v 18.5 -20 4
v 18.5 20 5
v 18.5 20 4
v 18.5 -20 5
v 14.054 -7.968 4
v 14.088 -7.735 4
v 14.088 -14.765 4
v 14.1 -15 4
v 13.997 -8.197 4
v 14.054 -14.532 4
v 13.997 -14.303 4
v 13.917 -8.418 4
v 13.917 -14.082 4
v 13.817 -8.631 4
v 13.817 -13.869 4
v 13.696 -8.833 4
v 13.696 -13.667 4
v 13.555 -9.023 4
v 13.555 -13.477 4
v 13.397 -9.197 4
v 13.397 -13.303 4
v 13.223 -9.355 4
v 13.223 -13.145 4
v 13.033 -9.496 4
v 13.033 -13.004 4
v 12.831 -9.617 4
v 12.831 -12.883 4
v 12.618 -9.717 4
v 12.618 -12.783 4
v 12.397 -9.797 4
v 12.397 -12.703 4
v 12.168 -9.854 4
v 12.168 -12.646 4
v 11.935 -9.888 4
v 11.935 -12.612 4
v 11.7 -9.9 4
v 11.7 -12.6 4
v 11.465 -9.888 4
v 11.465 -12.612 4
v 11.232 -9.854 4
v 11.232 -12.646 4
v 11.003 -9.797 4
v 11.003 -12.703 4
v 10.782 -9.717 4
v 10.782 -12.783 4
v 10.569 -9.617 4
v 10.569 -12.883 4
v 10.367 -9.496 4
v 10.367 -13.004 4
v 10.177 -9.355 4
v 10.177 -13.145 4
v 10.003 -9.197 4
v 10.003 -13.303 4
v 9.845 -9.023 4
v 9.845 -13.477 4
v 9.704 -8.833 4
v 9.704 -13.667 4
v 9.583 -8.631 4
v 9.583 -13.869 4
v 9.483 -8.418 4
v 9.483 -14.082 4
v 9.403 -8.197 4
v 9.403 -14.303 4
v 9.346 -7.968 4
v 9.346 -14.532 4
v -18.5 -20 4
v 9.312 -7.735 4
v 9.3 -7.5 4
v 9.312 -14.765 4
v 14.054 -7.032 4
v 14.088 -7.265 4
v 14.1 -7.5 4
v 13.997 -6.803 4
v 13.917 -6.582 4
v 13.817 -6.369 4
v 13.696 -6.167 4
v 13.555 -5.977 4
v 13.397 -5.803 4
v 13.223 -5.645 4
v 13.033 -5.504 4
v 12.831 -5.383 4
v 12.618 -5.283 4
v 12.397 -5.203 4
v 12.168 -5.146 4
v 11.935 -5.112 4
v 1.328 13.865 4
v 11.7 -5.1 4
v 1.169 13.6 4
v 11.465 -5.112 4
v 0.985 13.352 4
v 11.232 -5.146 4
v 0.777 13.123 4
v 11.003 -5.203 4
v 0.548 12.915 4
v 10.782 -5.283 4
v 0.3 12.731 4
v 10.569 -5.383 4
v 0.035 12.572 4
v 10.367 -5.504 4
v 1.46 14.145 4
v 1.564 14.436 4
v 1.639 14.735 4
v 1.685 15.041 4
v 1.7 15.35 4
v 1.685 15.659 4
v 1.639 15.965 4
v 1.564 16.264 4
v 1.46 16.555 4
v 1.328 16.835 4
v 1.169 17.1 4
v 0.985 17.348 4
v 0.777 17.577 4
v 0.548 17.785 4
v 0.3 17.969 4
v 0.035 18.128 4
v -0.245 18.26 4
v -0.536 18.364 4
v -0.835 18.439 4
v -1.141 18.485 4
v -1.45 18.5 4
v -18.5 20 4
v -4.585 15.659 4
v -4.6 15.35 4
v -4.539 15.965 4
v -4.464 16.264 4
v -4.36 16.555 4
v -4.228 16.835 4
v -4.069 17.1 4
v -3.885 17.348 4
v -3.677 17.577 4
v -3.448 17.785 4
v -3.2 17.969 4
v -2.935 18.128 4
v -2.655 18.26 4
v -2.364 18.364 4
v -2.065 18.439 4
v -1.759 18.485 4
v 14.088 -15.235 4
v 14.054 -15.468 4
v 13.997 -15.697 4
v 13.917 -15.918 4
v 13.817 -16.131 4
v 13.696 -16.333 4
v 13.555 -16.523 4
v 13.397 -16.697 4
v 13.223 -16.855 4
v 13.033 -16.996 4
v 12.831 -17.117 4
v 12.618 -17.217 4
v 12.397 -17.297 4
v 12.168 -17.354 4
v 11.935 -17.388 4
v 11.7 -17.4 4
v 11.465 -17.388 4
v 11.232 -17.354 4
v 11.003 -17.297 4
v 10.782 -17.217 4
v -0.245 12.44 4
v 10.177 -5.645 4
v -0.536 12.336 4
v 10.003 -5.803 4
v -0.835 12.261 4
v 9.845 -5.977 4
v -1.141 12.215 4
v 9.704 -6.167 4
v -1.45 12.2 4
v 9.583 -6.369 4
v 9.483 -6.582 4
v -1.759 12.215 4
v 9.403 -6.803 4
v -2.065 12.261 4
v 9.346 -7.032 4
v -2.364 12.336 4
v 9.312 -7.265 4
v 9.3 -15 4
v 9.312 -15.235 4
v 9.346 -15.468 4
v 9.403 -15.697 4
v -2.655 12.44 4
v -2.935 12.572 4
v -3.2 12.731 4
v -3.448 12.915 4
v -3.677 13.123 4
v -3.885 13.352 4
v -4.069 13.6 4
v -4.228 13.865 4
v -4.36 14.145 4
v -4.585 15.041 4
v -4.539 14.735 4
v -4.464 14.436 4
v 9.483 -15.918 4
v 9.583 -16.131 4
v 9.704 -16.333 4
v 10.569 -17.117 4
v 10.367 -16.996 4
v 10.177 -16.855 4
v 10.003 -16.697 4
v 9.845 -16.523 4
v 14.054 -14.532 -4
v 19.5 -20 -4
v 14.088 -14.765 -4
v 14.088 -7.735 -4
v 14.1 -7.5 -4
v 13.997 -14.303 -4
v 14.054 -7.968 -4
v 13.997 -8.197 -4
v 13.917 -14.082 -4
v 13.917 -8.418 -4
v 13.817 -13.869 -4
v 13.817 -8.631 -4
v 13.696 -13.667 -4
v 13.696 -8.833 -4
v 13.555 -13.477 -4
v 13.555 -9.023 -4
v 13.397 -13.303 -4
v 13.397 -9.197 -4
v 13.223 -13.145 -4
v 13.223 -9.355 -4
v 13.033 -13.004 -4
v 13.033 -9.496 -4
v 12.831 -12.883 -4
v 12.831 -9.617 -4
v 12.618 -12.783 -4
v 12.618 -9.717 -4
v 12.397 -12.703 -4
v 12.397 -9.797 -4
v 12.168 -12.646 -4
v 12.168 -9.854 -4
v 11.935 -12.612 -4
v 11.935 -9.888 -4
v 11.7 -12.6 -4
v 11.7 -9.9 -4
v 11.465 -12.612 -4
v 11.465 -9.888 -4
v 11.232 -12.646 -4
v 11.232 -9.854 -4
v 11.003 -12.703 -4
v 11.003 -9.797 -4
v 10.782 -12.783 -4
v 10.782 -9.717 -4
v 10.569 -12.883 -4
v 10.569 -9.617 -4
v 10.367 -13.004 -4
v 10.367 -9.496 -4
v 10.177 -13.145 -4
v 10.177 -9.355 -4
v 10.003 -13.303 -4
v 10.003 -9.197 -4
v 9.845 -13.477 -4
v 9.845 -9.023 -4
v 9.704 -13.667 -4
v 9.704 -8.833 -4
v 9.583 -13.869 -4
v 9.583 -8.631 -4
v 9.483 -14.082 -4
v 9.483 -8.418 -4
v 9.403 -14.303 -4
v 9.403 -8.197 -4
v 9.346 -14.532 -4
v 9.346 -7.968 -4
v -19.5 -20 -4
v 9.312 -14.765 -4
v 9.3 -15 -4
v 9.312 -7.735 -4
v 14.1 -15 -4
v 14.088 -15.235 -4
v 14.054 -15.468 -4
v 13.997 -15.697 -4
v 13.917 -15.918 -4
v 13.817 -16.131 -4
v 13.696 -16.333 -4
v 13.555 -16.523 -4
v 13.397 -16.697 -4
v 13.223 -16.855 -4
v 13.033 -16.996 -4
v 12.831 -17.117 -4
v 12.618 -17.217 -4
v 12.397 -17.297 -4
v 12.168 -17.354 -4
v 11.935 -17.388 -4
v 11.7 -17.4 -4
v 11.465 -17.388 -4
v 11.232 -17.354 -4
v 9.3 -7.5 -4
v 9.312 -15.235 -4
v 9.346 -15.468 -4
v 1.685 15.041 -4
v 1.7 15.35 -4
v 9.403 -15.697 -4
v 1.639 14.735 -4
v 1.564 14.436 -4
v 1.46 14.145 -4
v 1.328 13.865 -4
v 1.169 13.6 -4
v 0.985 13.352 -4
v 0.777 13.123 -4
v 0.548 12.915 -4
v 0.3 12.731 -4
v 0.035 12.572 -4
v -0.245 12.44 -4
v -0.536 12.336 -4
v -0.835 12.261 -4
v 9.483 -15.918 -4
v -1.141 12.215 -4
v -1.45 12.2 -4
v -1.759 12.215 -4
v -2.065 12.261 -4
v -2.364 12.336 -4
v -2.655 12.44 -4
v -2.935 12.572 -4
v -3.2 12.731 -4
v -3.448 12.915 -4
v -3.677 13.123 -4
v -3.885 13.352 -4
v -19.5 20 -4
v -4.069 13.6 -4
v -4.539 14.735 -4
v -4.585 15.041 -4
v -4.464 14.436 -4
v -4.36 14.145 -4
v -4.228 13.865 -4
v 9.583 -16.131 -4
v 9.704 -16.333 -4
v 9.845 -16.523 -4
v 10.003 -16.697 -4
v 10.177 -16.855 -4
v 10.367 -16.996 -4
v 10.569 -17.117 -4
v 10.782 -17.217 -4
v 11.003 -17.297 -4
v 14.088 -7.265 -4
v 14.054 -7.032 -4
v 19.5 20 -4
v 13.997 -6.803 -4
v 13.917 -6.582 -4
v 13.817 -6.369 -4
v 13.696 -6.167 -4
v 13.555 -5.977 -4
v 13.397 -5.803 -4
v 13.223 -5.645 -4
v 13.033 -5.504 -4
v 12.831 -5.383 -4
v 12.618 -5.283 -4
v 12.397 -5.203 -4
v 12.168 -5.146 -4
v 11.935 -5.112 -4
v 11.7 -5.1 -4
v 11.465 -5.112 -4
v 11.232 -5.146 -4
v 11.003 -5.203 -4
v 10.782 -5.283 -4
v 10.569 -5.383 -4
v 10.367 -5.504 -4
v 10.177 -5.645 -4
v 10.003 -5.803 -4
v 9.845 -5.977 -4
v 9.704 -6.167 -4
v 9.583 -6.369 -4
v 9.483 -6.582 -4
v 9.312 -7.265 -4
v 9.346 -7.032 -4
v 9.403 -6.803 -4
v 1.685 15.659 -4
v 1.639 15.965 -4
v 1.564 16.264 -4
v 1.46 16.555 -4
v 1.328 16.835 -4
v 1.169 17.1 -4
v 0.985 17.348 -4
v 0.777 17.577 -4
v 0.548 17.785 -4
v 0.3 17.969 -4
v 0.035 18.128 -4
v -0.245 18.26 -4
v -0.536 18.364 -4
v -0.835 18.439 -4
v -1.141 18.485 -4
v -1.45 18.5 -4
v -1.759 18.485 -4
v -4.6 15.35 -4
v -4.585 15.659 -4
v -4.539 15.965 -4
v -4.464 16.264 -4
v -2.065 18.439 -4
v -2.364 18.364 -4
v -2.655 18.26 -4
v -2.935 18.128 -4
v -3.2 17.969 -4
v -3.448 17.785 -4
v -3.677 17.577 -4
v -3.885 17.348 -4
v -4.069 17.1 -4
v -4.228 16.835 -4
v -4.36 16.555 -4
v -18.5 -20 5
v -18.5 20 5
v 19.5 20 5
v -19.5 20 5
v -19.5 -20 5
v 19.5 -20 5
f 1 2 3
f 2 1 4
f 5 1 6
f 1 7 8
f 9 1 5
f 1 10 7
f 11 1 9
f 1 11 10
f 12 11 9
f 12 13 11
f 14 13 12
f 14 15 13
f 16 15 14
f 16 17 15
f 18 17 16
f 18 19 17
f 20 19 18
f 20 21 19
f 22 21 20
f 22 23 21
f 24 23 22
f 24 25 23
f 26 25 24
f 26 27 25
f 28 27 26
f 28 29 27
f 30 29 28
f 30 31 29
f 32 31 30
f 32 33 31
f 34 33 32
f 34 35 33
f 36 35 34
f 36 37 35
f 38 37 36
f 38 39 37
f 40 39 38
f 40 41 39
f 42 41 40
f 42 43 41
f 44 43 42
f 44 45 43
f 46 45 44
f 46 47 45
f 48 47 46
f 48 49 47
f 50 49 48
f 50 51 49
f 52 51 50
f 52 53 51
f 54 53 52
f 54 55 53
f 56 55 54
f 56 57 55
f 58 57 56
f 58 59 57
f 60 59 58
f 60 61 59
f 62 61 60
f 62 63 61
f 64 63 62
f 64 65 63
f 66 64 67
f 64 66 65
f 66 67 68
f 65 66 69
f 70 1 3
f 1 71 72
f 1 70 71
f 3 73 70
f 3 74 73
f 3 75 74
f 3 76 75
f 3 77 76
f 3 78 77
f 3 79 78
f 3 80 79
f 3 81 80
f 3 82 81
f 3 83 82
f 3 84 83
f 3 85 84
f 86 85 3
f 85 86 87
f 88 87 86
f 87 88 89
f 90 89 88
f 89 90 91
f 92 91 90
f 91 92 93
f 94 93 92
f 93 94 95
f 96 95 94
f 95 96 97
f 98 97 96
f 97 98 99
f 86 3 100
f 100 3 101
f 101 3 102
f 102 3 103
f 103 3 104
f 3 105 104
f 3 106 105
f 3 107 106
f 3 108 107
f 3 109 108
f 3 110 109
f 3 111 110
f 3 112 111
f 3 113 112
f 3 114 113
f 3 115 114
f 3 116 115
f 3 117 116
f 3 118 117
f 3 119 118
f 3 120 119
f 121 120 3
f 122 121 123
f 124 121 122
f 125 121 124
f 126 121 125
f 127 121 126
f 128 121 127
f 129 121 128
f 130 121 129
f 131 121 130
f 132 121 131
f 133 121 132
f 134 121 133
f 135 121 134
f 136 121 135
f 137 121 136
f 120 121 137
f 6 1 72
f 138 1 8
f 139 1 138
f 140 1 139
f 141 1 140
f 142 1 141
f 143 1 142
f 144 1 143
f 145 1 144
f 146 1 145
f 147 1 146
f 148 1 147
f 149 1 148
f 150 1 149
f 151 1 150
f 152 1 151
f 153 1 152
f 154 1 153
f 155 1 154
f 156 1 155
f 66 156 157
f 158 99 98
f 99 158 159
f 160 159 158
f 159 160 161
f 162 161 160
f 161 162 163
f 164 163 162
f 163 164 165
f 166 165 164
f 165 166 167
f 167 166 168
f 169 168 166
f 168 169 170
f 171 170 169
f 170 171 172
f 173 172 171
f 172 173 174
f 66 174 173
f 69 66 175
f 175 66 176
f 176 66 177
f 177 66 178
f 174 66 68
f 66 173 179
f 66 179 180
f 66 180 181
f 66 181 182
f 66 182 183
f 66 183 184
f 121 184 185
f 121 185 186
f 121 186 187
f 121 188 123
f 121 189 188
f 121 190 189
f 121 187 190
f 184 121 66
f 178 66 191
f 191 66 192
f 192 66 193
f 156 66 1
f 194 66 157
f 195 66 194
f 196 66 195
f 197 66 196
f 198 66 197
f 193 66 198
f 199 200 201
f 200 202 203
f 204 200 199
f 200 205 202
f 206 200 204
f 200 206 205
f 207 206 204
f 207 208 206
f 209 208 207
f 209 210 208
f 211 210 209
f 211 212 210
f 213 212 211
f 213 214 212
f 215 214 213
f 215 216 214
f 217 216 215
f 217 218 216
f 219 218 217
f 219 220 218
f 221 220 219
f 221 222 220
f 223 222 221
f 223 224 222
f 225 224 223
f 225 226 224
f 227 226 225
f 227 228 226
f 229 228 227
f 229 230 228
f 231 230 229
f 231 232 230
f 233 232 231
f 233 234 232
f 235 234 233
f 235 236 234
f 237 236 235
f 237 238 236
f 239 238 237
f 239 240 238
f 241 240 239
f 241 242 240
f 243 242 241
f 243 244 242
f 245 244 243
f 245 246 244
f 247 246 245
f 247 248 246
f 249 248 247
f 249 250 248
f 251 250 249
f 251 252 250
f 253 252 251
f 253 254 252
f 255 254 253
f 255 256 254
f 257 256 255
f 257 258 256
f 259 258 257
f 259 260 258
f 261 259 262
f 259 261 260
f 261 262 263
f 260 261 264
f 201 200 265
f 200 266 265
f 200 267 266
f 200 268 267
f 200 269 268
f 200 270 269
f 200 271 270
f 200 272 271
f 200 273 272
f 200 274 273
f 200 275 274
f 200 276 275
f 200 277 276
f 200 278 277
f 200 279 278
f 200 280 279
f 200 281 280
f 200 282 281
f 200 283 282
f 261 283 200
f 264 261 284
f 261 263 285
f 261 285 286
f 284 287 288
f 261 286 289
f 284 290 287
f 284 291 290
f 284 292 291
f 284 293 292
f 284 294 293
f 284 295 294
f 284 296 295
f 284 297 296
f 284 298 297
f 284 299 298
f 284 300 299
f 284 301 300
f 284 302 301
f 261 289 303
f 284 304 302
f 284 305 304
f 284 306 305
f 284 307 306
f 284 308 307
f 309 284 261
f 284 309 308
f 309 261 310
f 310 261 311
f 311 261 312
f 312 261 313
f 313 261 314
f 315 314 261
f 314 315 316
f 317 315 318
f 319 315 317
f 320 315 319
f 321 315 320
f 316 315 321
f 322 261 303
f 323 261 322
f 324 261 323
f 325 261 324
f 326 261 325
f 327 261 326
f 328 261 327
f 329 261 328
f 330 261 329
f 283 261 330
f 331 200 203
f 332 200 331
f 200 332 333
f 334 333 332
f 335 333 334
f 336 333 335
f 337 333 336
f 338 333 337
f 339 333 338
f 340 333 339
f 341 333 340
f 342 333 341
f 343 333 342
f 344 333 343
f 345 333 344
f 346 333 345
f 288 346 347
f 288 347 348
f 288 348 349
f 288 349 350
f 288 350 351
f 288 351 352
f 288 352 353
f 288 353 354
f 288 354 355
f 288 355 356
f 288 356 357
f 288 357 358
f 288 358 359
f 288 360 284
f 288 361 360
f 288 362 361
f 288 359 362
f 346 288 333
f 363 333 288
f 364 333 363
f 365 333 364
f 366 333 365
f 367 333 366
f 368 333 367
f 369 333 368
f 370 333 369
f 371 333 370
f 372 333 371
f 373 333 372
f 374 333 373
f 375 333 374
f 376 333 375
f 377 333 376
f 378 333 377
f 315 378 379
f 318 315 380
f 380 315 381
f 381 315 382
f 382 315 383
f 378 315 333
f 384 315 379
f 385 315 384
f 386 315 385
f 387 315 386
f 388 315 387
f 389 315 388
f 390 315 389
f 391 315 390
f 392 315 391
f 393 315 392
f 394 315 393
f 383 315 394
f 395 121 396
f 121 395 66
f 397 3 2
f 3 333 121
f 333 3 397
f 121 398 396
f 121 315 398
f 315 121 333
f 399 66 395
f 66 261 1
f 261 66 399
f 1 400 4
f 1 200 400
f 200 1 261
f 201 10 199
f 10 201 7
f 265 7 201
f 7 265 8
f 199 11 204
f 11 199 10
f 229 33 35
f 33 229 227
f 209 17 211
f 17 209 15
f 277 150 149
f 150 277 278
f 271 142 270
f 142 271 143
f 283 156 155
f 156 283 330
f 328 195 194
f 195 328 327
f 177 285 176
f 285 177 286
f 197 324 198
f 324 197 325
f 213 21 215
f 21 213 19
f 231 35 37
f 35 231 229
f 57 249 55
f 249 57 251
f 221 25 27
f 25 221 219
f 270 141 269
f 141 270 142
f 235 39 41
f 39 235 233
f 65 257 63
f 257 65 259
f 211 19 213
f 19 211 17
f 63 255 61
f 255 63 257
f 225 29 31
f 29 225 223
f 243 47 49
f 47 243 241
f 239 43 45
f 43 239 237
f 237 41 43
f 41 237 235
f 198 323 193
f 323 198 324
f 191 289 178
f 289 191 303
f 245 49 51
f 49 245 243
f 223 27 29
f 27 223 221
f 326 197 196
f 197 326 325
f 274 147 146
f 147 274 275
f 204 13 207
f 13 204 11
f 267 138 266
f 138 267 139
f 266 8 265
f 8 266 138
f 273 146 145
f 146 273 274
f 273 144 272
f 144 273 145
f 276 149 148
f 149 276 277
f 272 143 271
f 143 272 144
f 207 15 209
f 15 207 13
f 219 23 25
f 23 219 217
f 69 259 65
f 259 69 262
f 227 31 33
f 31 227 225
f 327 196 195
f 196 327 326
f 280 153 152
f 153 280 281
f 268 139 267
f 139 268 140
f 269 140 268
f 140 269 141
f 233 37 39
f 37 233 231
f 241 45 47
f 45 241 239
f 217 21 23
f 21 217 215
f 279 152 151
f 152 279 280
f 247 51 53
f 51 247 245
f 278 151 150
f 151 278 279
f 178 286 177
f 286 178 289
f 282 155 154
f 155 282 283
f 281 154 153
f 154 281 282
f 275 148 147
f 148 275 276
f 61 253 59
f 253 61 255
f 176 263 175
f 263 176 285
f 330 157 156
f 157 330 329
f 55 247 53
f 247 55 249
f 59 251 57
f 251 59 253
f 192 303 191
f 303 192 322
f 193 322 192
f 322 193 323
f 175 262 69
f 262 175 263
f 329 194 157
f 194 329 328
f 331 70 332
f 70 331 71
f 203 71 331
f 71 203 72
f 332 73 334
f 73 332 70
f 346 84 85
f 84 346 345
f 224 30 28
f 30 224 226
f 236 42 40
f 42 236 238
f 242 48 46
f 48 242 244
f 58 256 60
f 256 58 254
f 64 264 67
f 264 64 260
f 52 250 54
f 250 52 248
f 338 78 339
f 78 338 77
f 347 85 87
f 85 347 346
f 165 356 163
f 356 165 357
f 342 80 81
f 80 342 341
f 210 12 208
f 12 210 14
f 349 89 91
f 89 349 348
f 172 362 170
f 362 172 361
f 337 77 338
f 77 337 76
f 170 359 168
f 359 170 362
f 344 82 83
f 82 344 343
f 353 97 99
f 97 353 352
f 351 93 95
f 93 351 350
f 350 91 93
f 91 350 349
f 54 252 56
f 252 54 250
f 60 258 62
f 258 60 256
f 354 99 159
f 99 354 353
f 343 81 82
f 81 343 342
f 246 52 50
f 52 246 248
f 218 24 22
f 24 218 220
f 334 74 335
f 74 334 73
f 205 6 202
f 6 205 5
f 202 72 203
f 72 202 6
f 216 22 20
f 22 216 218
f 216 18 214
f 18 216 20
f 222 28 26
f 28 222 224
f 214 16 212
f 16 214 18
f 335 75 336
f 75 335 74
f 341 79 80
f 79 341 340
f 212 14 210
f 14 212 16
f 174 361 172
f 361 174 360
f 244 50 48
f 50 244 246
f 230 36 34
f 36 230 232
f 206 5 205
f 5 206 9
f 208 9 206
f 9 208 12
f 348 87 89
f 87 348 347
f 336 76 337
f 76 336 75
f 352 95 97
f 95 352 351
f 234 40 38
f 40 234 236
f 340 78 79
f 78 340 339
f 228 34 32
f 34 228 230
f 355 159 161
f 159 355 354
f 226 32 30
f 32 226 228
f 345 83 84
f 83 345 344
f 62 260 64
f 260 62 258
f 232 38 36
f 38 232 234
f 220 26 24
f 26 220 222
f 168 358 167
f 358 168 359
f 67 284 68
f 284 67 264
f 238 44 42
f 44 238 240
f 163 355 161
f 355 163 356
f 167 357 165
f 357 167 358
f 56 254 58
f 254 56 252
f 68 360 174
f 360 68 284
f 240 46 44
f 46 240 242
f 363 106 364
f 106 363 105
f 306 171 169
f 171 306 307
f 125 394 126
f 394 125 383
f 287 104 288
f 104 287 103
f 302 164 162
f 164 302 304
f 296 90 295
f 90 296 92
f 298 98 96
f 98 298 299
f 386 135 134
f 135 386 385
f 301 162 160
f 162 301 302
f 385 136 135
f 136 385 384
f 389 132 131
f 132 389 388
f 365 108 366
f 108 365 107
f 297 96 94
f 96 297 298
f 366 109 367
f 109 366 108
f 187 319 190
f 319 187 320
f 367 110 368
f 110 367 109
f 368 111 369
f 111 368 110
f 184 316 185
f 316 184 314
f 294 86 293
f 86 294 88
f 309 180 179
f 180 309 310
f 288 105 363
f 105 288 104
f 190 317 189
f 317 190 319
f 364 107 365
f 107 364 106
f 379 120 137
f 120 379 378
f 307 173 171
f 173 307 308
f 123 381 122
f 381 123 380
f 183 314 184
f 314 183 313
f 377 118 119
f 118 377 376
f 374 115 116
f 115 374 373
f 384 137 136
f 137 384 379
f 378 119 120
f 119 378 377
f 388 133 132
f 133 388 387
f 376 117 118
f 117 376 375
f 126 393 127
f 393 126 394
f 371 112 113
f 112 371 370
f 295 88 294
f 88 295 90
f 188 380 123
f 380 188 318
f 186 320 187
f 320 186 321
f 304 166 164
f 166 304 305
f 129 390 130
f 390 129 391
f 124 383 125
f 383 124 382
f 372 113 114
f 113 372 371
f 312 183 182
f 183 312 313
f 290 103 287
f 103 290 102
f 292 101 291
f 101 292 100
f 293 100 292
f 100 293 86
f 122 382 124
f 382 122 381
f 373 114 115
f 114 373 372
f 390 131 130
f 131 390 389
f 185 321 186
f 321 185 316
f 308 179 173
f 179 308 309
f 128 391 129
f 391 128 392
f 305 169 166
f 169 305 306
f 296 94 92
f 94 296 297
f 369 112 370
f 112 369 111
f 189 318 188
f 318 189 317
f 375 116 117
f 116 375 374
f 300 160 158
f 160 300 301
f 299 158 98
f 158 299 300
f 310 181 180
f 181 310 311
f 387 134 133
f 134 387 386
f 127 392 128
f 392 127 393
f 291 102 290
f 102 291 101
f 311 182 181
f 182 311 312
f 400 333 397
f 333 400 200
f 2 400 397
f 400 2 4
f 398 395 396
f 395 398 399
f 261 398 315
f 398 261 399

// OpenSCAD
railX=37.0;
railY=40;
railZ=8;
holeD=4.8;
holeX=railX/2-6.8;
hole1Y=-railY/2+5;
hole2Y=-railY/2+12.5;
frameThickness=1;

guardholeD=6.3;
guardholeX=railX/2-(16.8+guardholeD/2);
guardholeY=-railY/2+(32.2+guardholeD/2);

module FReverbuilt()
{
difference() {
    cube([railX,railY,railZ],center=true);
    translate([holeX,hole1Y,0])cylinder(d=holeD,h=railZ+0.01,$fn=64,center=true);
    translate([holeX,hole2Y,0])cylinder(d=holeD,h=railZ+0.01,$fn=64,center=true);
    translate([guardholeX,guardholeY,0])cylinder(d=guardholeD,h=railZ+0.01,$fn=64,center=true);
}

//Frame
translate([railX/2+frameThickness/2,0,frameThickness/2])cube([frameThickness,railY,railZ+frameThickness],center=true);
translate([-railX/2-frameThickness/2,0,frameThickness/2])cube([frameThickness,railY,railZ+frameThickness],center=true);

}

FReverbuilt();
